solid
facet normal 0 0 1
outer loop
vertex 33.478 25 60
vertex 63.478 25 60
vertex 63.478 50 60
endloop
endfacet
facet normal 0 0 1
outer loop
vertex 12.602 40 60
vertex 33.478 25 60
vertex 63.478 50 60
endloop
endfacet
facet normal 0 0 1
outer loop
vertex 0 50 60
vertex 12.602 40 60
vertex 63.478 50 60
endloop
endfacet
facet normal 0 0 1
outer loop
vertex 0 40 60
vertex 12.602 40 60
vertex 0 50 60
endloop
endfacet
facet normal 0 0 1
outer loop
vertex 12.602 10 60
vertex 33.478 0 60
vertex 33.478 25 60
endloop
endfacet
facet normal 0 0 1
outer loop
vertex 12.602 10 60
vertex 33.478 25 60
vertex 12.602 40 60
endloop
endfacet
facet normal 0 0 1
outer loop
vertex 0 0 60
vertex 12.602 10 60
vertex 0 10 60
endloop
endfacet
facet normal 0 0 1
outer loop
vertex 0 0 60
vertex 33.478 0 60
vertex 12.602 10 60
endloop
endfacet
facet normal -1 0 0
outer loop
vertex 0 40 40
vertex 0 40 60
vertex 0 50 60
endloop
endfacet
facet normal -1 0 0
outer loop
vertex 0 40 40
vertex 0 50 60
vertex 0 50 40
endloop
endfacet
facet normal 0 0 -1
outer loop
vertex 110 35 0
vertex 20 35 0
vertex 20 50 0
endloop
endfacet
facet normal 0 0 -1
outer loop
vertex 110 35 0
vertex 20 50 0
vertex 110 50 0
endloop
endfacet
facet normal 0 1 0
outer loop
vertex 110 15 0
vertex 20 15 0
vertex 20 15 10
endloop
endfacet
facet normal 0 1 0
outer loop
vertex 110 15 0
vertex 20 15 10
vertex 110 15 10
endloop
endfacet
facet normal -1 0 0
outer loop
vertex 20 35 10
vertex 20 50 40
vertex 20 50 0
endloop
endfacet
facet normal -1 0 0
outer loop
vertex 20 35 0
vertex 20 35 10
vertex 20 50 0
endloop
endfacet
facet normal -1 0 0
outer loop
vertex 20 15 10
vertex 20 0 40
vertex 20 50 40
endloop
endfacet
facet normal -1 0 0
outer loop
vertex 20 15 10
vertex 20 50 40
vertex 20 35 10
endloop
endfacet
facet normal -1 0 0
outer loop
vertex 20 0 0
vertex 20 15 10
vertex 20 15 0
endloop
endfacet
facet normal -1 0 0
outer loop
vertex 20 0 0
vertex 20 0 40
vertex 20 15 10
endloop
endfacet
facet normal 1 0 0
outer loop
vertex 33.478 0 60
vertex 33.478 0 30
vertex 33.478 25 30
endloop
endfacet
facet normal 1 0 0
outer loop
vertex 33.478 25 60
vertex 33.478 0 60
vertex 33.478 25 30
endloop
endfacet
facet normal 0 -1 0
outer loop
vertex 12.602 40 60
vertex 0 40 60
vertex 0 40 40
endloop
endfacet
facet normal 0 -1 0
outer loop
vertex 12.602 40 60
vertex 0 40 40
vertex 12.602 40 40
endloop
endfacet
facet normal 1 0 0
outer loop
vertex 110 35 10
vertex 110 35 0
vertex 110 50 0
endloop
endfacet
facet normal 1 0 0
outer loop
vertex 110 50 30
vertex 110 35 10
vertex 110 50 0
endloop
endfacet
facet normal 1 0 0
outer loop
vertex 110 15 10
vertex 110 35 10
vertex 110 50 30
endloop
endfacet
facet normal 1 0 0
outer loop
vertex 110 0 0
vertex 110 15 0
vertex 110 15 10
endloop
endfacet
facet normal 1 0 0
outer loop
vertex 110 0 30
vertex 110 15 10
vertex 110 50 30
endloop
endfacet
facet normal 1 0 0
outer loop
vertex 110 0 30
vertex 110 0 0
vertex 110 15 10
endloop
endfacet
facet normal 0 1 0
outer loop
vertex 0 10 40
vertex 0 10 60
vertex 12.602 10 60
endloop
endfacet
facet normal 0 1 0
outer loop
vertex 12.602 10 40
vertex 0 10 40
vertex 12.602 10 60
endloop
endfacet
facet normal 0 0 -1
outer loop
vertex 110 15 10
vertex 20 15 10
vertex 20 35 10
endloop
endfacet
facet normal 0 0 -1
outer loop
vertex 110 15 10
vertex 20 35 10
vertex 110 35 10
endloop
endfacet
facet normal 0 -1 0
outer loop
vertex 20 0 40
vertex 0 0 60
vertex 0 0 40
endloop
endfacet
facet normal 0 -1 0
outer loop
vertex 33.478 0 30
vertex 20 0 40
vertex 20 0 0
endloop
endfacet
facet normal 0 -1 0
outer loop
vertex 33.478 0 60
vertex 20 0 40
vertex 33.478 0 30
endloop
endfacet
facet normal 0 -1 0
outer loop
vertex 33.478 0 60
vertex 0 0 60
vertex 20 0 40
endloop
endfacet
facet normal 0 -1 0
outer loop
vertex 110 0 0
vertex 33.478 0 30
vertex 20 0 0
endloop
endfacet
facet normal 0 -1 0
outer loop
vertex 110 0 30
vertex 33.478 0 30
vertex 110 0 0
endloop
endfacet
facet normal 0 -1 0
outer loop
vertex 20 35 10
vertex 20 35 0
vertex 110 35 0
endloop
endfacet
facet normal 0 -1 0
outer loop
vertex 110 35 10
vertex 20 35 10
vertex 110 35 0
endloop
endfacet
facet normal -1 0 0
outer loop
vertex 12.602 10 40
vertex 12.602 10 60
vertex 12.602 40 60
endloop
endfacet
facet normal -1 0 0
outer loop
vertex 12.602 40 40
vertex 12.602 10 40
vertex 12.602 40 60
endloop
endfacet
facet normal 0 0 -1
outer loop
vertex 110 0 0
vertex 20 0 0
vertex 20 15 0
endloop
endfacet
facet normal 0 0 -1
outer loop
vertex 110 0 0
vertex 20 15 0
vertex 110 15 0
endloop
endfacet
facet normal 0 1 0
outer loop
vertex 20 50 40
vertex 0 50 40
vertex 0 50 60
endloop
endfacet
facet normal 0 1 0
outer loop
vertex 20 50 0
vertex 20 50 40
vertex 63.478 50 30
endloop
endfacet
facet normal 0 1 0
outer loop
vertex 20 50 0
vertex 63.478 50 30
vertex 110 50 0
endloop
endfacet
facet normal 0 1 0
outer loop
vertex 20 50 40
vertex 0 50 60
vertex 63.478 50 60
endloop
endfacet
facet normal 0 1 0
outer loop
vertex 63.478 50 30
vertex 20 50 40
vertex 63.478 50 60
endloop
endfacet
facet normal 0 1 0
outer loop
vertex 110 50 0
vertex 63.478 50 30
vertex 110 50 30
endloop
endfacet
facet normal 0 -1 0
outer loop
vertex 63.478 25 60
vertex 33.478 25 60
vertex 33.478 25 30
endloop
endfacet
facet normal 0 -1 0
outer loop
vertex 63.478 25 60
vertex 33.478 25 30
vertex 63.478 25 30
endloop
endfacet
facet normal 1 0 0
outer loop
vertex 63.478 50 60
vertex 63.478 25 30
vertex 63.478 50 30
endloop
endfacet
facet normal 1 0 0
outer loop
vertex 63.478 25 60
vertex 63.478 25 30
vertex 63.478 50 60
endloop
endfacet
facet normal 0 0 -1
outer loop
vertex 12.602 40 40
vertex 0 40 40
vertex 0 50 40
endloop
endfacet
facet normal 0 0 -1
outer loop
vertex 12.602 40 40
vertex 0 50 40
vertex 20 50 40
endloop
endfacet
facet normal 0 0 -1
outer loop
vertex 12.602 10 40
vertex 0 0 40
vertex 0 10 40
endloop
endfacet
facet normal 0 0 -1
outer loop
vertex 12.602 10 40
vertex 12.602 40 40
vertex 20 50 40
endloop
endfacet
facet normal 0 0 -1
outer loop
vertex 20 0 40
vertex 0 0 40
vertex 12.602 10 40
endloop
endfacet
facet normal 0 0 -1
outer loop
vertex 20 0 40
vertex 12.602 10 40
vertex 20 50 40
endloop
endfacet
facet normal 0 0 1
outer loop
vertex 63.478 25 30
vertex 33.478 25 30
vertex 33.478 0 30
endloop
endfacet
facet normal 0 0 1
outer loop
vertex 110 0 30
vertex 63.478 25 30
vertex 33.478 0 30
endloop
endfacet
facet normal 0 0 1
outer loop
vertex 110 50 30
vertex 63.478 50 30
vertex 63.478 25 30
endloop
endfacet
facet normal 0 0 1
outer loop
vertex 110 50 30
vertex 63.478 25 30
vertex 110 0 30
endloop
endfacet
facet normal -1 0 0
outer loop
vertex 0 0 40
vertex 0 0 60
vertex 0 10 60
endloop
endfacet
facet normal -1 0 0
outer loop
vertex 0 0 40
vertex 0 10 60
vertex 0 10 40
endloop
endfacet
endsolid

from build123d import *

# Parameters (mm, degrees)
F1_W     = 22.3188386493
F1_H     = 30
F2_DEPTH = 50
F3_W     = 30
F3_H     = 25
F4_DEPTH = 30
F5_W     = 12.6015079648
F5_H     = 30
F6_DEPTH = 60
F7_W     = 90
F7_H     = 20
F8_DEPTH = 10


with BuildPart() as f2:
    # F1 (on Front) → F2 (new body)
    with BuildSketch(Plane.XZ):
        Polygon((20, 40), (20, 0), (110, 0), (110, 30), (63.4782647698, 30), (41.1594261205, 30), (41.1594261205, 60), (0, 60), (0, 40), align=None)
        with Locations((52.3188454451, 45)):
            Rectangle(F1_W, F1_H)
    extrude(amount=-F2_DEPTH)

    # F3 (on face) → F4 (cut)
    with BuildSketch(Plane.XY.offset(60)):
        with Locations((48.4782647698, 12.5)):
            Rectangle(F3_W, F3_H)
    extrude(amount=-F4_DEPTH, mode=Mode.SUBTRACT)

    # F5 (on face) → F6 (cut)
    with BuildSketch(Plane.XY.offset(60)):
        with Locations((6.3007539824, 25)):
            Rectangle(F5_W, F5_H)
    extrude(amount=-F6_DEPTH, mode=Mode.SUBTRACT)

    # F7 (on face) → F8 (cut)
    with BuildSketch(Plane(origin=(0, 0, 0), x_dir=(1, 0, 0), z_dir=(0, 0, -1))):
        with Locations((65, -25)):
            Rectangle(F7_W, F7_H)
    extrude(amount=-F8_DEPTH, mode=Mode.SUBTRACT)


solid = f2.part
